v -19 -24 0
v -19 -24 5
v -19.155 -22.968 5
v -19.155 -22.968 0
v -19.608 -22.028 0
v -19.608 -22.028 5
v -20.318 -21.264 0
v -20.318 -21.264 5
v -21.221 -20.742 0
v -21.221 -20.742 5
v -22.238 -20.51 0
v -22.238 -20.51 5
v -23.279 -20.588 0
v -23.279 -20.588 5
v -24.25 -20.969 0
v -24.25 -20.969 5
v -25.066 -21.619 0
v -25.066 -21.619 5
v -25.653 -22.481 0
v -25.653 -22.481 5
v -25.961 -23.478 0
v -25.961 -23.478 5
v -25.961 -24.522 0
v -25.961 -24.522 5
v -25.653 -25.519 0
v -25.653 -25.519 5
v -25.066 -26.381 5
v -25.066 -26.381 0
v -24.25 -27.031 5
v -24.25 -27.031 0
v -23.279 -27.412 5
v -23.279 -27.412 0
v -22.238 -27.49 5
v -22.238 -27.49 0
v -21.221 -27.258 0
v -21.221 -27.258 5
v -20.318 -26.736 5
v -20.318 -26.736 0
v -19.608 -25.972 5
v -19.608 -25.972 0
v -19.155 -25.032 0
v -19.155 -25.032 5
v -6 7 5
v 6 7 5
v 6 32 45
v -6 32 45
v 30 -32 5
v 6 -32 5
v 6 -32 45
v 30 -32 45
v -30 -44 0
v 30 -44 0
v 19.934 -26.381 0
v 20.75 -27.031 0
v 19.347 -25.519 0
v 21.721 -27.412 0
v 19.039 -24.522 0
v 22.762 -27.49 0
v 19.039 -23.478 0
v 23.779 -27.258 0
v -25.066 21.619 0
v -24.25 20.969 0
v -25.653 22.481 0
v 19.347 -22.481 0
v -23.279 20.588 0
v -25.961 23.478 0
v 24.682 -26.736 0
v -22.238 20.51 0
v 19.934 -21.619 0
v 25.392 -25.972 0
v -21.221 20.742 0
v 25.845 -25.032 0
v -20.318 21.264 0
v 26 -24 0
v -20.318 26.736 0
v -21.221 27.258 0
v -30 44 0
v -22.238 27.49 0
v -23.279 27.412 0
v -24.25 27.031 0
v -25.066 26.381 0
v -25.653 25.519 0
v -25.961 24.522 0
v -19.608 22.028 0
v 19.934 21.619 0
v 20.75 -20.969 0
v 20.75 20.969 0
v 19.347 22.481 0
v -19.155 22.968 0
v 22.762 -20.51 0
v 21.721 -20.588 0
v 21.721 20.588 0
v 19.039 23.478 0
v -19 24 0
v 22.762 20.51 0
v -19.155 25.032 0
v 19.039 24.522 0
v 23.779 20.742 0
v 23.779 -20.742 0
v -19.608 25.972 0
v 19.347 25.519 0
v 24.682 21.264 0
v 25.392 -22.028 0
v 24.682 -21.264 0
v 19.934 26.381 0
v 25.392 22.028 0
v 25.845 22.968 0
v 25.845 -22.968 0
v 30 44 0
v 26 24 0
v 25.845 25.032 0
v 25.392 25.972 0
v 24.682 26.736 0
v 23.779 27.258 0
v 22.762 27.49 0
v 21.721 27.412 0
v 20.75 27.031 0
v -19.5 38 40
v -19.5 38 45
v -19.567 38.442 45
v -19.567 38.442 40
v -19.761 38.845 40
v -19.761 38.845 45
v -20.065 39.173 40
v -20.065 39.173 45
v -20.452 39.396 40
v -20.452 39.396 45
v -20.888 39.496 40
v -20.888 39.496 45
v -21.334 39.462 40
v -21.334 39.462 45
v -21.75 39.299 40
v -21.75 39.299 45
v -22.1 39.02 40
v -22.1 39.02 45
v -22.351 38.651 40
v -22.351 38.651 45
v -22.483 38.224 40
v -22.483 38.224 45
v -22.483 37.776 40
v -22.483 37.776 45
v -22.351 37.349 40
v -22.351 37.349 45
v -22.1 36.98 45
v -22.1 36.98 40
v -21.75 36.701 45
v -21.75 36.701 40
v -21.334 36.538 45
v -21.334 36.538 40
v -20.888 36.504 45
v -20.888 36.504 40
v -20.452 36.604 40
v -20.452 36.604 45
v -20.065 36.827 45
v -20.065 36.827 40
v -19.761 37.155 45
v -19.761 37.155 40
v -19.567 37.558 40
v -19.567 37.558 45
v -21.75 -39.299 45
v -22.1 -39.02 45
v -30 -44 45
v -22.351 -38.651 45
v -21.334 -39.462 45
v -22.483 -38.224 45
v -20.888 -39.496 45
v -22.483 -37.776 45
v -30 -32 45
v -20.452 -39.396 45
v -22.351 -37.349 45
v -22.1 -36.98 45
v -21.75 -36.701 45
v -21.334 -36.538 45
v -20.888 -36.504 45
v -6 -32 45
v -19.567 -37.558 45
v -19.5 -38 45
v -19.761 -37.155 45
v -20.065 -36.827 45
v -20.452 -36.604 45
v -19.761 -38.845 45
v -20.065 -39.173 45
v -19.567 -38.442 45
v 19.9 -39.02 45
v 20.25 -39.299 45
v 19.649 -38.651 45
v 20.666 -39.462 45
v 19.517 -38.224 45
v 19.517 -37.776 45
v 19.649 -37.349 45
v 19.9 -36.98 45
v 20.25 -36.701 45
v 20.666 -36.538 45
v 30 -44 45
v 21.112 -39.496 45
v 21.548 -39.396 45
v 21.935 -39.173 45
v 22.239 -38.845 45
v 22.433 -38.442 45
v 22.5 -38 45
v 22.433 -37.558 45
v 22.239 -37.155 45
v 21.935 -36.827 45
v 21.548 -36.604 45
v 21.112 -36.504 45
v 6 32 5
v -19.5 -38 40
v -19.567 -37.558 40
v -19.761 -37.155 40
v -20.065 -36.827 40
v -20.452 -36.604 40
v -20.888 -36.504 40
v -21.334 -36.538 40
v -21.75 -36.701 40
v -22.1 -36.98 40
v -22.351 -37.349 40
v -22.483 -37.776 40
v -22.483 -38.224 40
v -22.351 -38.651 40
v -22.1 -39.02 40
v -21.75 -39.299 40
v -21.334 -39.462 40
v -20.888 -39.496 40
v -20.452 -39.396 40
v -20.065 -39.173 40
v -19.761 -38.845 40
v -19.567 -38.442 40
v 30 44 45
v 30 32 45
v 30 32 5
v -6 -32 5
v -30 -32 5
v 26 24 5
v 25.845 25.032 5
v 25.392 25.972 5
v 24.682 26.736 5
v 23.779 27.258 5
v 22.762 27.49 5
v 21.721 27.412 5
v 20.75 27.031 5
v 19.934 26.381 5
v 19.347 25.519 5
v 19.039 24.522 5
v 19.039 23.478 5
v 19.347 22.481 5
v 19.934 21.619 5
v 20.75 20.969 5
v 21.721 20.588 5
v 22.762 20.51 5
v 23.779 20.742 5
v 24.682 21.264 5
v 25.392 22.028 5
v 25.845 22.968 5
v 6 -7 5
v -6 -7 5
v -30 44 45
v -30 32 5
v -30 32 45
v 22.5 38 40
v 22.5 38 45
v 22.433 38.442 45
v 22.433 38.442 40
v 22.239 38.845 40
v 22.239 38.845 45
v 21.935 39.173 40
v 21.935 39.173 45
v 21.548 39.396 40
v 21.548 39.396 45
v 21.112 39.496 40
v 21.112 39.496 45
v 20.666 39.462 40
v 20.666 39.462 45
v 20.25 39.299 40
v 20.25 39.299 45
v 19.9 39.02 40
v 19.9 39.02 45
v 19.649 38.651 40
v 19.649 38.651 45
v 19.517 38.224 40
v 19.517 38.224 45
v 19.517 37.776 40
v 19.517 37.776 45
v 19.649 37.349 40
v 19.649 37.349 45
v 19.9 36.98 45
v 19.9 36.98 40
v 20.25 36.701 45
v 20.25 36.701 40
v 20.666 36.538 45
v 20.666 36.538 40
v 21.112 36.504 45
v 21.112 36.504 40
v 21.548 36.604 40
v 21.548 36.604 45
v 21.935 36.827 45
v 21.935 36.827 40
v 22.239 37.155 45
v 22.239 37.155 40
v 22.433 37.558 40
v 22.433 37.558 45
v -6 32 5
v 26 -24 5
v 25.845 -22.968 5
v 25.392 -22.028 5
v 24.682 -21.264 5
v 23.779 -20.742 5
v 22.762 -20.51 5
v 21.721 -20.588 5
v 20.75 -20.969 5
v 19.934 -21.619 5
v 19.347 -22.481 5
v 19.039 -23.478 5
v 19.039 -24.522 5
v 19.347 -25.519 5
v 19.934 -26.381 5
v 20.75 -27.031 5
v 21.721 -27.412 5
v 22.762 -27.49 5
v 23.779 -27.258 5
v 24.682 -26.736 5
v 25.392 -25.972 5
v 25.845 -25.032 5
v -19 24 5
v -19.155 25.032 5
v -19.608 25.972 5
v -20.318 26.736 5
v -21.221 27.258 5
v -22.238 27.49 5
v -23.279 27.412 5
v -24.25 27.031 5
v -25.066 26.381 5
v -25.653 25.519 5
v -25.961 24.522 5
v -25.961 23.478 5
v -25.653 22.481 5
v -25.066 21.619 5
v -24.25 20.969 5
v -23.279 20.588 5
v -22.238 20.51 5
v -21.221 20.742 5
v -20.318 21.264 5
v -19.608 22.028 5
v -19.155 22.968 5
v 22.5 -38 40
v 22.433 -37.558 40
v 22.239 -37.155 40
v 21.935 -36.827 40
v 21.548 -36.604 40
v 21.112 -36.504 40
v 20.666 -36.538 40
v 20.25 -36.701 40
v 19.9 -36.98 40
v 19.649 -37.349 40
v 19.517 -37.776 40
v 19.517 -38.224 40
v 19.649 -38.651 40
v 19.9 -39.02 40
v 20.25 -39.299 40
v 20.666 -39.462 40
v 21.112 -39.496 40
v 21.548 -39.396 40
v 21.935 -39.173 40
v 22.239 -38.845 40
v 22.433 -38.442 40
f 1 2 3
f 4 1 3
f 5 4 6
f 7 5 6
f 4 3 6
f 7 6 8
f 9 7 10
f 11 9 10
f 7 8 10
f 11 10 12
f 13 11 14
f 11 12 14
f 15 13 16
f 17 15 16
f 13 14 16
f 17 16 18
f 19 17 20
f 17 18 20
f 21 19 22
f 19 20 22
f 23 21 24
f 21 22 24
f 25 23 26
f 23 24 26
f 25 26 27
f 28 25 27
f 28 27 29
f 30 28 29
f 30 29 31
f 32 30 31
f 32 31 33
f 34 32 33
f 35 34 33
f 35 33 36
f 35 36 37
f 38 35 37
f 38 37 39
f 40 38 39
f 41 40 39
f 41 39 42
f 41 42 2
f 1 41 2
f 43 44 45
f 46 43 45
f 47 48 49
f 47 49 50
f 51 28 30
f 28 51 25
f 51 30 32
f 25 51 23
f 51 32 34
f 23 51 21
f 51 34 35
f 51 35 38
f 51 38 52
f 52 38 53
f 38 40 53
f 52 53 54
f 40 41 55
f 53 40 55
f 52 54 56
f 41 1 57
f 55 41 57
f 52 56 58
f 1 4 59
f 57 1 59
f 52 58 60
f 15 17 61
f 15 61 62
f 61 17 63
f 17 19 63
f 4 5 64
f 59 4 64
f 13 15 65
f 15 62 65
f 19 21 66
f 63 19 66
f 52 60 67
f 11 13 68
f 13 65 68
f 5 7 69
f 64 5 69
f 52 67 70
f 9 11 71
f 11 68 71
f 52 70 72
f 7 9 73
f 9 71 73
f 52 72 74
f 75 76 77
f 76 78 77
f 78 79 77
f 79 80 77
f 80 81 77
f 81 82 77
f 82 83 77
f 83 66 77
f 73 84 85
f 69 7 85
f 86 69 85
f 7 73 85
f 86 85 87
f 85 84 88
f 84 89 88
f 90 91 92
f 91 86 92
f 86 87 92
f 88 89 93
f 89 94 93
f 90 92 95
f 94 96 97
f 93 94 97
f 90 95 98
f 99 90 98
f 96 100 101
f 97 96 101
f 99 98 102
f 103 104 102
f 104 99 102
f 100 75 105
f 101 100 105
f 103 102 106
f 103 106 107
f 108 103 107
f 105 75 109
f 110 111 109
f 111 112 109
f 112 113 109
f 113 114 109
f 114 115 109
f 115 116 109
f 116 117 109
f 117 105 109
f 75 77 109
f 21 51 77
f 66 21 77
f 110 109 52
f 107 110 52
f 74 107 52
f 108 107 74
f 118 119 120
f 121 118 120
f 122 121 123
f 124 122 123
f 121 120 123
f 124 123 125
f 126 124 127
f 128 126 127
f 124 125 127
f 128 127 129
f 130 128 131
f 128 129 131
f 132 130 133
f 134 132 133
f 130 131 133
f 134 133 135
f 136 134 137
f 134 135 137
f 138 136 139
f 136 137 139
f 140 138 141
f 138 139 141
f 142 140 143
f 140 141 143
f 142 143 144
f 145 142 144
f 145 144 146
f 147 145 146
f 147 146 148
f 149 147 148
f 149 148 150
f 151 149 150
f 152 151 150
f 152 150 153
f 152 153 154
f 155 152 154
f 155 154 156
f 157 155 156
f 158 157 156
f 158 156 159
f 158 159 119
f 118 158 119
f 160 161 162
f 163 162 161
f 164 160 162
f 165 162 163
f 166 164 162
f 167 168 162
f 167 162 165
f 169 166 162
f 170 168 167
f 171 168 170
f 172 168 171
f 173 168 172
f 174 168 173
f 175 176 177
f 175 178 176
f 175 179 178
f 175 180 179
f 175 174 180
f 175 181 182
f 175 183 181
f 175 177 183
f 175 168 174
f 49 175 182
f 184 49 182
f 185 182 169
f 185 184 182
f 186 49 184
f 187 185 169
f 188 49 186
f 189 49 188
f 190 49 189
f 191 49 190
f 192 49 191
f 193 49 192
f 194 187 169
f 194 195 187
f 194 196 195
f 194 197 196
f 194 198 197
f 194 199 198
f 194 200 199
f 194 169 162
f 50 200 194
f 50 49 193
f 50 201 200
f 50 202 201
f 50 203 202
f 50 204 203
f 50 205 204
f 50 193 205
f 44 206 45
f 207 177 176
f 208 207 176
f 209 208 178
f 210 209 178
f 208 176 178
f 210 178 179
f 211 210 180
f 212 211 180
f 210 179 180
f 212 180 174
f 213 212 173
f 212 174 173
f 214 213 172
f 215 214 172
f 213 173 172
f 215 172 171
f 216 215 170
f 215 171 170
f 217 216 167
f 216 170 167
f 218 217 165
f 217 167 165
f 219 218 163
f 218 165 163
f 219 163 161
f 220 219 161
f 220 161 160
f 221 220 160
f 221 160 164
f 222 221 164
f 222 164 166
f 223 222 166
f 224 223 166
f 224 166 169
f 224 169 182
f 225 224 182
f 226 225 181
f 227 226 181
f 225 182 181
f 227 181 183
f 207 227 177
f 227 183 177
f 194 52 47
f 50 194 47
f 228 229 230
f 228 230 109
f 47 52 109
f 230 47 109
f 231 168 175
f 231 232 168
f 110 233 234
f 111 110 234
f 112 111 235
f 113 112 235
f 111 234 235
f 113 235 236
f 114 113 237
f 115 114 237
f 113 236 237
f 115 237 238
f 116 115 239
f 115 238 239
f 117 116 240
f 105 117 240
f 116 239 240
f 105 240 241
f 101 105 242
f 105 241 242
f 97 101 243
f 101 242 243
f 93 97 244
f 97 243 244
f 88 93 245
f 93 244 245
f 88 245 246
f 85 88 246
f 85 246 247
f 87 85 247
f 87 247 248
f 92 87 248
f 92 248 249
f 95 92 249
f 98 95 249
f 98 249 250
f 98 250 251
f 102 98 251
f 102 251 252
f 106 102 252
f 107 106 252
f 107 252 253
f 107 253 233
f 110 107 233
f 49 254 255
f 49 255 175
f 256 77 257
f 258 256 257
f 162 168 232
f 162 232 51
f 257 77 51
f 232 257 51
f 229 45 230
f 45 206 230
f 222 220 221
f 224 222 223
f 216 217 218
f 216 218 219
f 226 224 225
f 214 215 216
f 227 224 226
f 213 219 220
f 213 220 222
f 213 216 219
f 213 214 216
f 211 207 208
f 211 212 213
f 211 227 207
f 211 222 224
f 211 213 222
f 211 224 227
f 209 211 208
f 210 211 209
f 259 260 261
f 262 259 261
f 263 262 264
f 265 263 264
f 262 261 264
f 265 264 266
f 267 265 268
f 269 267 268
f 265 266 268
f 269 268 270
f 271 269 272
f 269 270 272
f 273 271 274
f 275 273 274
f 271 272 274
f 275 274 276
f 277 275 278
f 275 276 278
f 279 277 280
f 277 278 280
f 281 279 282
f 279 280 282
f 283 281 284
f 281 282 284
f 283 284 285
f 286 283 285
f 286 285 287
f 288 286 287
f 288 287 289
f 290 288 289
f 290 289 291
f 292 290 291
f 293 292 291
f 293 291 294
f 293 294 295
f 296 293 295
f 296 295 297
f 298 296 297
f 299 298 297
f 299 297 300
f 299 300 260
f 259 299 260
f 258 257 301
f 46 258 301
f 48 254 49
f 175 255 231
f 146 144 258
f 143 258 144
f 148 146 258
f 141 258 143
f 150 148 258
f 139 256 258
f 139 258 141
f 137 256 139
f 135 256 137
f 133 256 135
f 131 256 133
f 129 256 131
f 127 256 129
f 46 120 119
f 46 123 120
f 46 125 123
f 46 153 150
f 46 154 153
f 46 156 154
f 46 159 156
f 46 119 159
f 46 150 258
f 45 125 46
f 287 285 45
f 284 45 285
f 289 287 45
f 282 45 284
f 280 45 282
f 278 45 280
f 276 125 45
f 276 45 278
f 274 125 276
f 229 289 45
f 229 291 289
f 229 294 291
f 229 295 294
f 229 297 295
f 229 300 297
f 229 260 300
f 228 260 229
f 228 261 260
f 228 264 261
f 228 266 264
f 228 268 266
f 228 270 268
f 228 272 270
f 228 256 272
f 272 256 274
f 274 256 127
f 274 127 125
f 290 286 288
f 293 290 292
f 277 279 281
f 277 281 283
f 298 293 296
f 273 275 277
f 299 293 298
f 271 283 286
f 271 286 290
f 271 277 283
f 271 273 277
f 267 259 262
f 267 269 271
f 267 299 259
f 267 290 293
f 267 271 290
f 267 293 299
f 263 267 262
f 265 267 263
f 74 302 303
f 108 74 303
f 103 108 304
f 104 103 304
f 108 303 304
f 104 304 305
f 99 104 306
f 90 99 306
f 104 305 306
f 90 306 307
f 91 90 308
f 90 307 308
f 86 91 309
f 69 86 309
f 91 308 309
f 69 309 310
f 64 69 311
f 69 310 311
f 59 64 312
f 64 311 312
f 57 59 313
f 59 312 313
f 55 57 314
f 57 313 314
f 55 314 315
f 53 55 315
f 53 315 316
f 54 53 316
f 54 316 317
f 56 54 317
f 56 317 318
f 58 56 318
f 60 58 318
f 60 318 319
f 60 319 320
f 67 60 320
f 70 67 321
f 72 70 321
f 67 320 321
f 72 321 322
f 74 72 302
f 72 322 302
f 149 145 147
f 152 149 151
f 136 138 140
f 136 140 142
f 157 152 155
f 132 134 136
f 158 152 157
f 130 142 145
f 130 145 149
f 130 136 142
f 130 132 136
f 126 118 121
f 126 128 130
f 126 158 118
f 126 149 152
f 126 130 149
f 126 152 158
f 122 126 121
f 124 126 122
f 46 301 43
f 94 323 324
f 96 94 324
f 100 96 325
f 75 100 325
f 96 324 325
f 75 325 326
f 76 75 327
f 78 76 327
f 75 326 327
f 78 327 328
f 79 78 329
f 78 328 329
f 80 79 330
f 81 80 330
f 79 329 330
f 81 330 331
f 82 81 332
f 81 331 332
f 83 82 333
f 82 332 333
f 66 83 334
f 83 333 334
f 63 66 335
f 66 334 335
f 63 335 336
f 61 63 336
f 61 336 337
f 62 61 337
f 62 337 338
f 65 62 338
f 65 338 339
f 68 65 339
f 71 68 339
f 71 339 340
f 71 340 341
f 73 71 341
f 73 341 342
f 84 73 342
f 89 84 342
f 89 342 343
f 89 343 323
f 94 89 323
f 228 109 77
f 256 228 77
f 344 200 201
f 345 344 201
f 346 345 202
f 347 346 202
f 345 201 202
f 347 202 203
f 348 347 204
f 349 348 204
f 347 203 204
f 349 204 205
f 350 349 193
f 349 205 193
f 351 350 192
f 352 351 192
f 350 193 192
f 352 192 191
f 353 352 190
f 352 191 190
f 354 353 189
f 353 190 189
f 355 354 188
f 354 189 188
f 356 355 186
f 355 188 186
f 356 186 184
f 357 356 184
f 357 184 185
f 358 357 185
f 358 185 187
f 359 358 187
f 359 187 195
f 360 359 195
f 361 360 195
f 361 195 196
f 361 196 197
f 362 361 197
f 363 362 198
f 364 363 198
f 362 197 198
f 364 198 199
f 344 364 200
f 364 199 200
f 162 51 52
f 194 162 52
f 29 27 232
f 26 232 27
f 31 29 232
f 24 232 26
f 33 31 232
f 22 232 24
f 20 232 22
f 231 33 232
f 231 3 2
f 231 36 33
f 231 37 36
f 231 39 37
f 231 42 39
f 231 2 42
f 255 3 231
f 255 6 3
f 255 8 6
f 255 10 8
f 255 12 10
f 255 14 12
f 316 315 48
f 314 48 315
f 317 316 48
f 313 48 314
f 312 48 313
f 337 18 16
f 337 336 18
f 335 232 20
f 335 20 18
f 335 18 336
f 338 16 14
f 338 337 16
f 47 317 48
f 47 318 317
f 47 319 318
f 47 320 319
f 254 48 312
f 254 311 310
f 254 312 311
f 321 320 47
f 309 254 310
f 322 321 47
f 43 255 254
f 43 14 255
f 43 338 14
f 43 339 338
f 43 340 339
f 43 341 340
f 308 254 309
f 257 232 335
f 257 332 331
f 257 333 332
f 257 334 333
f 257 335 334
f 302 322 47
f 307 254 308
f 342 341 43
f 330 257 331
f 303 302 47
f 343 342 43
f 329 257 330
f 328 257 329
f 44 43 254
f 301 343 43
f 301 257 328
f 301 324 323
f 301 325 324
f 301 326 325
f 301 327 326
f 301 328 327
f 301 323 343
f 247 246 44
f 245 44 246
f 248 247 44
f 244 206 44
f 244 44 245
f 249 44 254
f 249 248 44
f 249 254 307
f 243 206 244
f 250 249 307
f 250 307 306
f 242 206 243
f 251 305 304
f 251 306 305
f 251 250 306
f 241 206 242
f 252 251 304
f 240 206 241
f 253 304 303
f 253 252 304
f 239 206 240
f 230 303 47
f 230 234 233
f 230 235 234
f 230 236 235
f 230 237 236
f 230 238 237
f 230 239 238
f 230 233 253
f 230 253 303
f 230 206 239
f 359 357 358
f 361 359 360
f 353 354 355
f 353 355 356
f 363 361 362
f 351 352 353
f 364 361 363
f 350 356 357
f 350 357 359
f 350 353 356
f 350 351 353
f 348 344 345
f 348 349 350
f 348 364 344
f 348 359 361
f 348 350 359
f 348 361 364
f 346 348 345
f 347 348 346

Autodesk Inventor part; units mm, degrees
ref_plane "YZ Plane" through (0, 0, 0) normal (1, 0, 0) x (0, 1, 0)
ref_plane "XZ Plane" through (0, 0, 0) normal (0, 1, 0) x (-1, 0, 0)
ref_plane "XY Plane" through (0, 0, 0) normal (0, 0, 1) x (1, 0, 0)
sketch "Sketch1" plane through (0, 0, 0) normal (0, 0, 1) x (1, 0, 0)
  line L0 (-30, 44) -> (-30, -44) projected
  line L1 (-30, -44) -> (30, -44) projected
  line L2 (30, -44) -> (30, 44) projected
  line L3 (30, 44) -> (-30, 44) projected
  circle A0 centre (22.5, -24) radius 3 projected
  circle A1 centre (-22.5, -24) radius 3 projected
  line L4 (-15, -4) -> (-30, -4) projected
  line L5 (-30, -4) -> (-30, -44) projected
  line L6 (-15, -44) -> (-30, -44) projected
  line L7 (-15, -4) -> (-15, -44) projected
  circle A2 centre (-22.5, 24) radius 3 projected
  line L8 (-15, 44) -> (-30, 44) projected
  line L9 (-30, 44) -> (-30, 4) projected
  line L10 (-15, 4) -> (-30, 4) projected
  line L11 (-15, 44) -> (-15, 4) projected
  circle A3 centre (-22.5, 24) radius 3 projected
  line L12 (-15, 4) -> (-30, 4) projected
  line L13 (-30, 4) -> (-30, 44) projected
  line L14 (-15, 44) -> (-30, 44) projected
  line L15 (-15, 4) -> (-15, 44) projected
  circle A4 centre (-22.5, 24) radius 3 projected
  line L16 (-15, 4) -> (-30, 4) projected
  line L17 (-30, 4) -> (-30, 44) projected
  line L18 (-15, 44) -> (-30, 44) projected
  line L19 (-15, 4) -> (-15, 44) projected
  circle A5 centre (-22.5, 24) radius 3 projected
  line L20 (-15, 4) -> (-30, 4) projected
  line L21 (-30, 4) -> (-30, 44) projected
  line L22 (-15, 44) -> (-30, 44) projected
  line L23 (-15, 4) -> (-15, 44) projected
  circle A6 centre (-22.5, 24) radius 3 projected
  line L24 (-15, 4) -> (-30, 4) projected
  line L25 (-30, 4) -> (-30, 44) projected
  line L26 (-15, 44) -> (-30, 44) projected
  line L27 (-15, 4) -> (-15, 44) projected
  circle A7 centre (-22.5, 24) radius 3 projected
  line L28 (-15, 4) -> (-30, 4) projected
  line L29 (-30, 4) -> (-30, 44) projected
  line L30 (-15, 44) -> (-30, 44) projected
  line L31 (-15, 4) -> (-15, 44) projected
  circle A8 centre (22.5, 24) radius 3 projected
  line L32 (30, 4) -> (15, 4) projected
  line L33 (15, 4) -> (15, 44) projected
  line L34 (30, 44) -> (15, 44) projected
  line L35 (30, 4) -> (30, 44) projected
  point P0 (0, 0)
extrude "Extrusion1" add sketch "Sketch1" along normal blind 5
sketch "Sketch2" plane through (0, 0, 5) normal (0, 0, 1) x (1, 0, 0)
  line L0 (30, 44) -> (-30, 44) projected
  line L1 (-30, 44) -> (-30, -44) projected
  line L2 (30, 44) -> (-30, 44)
  line L3 (-30, 44) -> (-30, 32)
  line L4 (-30, 32) -> (30, 32)
  line L5 (30, 32) -> (30, 44)
  line L6 (30, -44) -> (-30, -44)
  line L7 (-30, -44) -> (-30, -32)
  line L8 (-30, -32) -> (30, -32)
  line L9 (30, -32) -> (30, -44)
  point P0 (0, 0)
  dimension "d2" = 12
  dimension "d3" = 12
extrude "Extrusion2" add sketch "Sketch2" along normal blind 40
sketch "Sketch3" plane through (0, 0, 45) normal (0, 0, 1) x (1, 0, 0)
  circle A0 centre (21, 38) radius 1.5
  circle A1 centre (-21, 38) radius 1.5
  circle A2 centre (21, -38) radius 1.5
  circle A3 centre (-21, -38) radius 1.5
  line L0 (-30, 32) -> (30, 32) projected
  line L1 (-30, -44) -> (30, -44) projected
  line L2 (30, 32) -> (30, 44) projected
  line L3 (30, -44) -> (30, -32) projected
  point P0 (0, 0)
  dimension "d6" = 3
  dimension "d7" = 3
  dimension "d8" = 3
  dimension "d9" = 3
  dimension "d10" = 6
  dimension "d11" = 6
  dimension "d12" = 42
  dimension "d13" = 42
  dimension "d14" = 9
  dimension "d15" = 9
extrude "Extrusion3" cut sketch "Sketch3" against normal blind 5
sketch "Sketch4" plane through (0, 0, 5) normal (0, 0, 1) x (1, 0, 0)
  circle A0 centre (22.5, 24) radius 3 projected
  circle A1 centre (22.5, 24) radius 3.5
  circle A2 centre (22.5, -24) radius 3 projected
  circle A3 centre (22.5, -24) radius 3.5
  circle A4 centre (-22.5, 24) radius 3 projected
  circle A5 centre (-22.5, 24) radius 3.5
  circle A6 centre (-22.5, -24) radius 3 projected
  circle A7 centre (-22.5, -24) radius 3.5
  point P0 (0, 0)
  dimension "d18" = 7
  dimension "d19" = 7
  dimension "d20" = 7
  dimension "d21" = 7
extrude "Extrusion4" cut sketch "Sketch4" against normal blind 5 contours A0 | A1 | A2 | A3 | A4 | A5 | A6 | A7
ref_plane "Work Plane1" through (0, -44, 0) normal (-1, 0, 0) x (0, 0, 1)
sketch "Sketch5" plane through (0, -44, 0) normal (-1, 0, 0) x (0, 0, 1)
  line L0 (5, 76) -> (5, 12) projected
  line L1 (5, 76) -> (5, 51)
  line L2 (45, 76) -> (45, 88) projected
  line L3 (5, 51) -> (45, 76)
  line L4 (5, 76) -> (45, 76) projected
  line L5 (45, 76) -> (5, 76)
  line L6 (5, 12) -> (45, 12) projected
  line L7 (5, 12) -> (5, 37)
  line L8 (45, 12) -> (45, 0) projected
  line L9 (5, 37) -> (45, 12)
  line L10 (45, 12) -> (5, 12)
  point P0 (0, 44)
  dimension "d24" = 25
  dimension "d25" = 25
extrude "Extrusion5" add sketch "Sketch5" along normal mid plane 12
properties part number "bearingV2"
